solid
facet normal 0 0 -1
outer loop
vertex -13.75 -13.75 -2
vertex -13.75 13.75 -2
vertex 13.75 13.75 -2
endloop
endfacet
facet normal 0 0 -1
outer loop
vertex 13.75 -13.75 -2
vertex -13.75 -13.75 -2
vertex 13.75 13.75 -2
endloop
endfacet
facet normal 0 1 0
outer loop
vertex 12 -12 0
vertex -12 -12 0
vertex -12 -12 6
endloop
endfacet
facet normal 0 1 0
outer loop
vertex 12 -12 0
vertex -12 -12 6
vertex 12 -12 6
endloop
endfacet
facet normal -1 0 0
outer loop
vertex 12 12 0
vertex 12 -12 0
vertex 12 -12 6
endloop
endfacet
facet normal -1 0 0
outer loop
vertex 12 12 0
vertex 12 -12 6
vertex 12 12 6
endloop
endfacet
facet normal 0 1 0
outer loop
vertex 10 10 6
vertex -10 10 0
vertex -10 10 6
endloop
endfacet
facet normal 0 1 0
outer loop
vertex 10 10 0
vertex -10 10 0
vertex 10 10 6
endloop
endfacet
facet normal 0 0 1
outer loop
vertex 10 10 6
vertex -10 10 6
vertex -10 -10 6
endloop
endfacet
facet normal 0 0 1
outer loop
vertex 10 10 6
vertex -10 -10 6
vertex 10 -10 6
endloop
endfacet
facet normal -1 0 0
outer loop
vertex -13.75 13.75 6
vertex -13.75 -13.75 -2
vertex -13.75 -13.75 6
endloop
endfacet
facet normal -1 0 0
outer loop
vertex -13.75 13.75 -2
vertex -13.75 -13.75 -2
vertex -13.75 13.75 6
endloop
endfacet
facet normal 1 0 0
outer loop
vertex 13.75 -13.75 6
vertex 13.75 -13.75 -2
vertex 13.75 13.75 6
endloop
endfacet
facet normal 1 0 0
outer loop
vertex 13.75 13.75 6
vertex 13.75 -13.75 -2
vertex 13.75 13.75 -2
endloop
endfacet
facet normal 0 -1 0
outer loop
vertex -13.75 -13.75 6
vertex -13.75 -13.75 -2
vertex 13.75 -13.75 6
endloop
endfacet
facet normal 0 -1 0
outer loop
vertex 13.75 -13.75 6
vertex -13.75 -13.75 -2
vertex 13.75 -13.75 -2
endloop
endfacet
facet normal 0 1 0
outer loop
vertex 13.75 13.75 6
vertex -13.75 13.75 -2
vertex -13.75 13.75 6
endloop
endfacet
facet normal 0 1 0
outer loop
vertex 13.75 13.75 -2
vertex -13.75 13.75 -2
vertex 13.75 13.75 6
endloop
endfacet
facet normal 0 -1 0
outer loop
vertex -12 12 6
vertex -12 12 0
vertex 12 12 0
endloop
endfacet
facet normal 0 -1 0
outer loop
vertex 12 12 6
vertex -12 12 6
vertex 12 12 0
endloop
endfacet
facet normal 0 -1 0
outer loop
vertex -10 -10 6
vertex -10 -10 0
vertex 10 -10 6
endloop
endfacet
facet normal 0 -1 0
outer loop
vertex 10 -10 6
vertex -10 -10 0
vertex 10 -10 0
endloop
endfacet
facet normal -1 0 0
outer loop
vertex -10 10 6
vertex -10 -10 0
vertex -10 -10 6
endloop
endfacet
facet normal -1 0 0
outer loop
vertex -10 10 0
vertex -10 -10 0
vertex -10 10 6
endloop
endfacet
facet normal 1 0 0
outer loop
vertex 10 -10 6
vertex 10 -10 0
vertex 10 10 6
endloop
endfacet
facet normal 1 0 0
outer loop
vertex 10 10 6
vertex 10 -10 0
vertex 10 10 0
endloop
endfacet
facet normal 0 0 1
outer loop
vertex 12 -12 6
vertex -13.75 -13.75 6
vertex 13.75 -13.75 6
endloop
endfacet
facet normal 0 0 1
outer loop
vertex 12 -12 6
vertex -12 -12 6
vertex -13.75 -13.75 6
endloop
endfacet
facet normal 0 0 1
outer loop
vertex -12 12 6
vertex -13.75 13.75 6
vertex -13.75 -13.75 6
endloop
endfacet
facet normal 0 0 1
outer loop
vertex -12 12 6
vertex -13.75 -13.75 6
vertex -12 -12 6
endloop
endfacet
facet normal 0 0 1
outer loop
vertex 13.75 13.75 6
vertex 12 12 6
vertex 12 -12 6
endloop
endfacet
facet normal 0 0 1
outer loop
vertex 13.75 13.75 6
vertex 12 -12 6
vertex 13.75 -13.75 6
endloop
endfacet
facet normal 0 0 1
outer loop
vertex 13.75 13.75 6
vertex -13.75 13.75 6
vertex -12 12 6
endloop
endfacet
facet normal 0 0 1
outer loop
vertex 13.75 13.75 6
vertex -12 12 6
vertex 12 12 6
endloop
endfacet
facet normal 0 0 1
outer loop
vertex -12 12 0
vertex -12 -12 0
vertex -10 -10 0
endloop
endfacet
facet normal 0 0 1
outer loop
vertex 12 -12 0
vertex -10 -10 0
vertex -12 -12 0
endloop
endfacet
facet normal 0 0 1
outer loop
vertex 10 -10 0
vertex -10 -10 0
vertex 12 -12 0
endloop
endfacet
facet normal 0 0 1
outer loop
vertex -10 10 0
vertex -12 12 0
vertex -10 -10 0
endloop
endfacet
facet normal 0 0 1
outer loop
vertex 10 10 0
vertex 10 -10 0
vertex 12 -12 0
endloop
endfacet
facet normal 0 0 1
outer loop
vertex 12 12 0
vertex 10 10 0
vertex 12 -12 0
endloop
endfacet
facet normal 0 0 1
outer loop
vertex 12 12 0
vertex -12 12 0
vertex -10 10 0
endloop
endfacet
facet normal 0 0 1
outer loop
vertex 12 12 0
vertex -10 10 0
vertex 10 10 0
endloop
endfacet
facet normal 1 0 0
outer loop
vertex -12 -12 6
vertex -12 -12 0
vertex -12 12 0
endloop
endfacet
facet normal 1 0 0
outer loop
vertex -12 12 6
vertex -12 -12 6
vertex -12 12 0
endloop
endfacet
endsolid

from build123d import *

# Parameters (mm, degrees)
F0_W     = 27.5
F0_H     = 27.5
F0_W_2   = 24
F0_H_2   = 24
F0_W_3   = 20
F0_H_3   = 20
F1_DEPTH = 2
F2_DEPTH = 6


with BuildPart() as f1:
    # F0 (on Top) → F1 (new body)
    with BuildSketch(Plane.XY):
        Rectangle(F0_W, F0_H)
        Rectangle(F0_W_2, F0_H_2, mode=Mode.SUBTRACT)
        Rectangle(F0_W_2, F0_H_2)
        Rectangle(F0_W_3, F0_H_3, mode=Mode.SUBTRACT)
        Rectangle(F0_W_3, F0_H_3)
    extrude(amount=-F1_DEPTH)

    # F0 (on Top) → F2 (join)
    with BuildSketch(Plane.XY):
        Rectangle(F0_W, F0_H)
        Rectangle(F0_W_2, F0_H_2, mode=Mode.SUBTRACT)
        Rectangle(F0_W_3, F0_H_3)
    extrude(amount=F2_DEPTH)


solid = f1.part
